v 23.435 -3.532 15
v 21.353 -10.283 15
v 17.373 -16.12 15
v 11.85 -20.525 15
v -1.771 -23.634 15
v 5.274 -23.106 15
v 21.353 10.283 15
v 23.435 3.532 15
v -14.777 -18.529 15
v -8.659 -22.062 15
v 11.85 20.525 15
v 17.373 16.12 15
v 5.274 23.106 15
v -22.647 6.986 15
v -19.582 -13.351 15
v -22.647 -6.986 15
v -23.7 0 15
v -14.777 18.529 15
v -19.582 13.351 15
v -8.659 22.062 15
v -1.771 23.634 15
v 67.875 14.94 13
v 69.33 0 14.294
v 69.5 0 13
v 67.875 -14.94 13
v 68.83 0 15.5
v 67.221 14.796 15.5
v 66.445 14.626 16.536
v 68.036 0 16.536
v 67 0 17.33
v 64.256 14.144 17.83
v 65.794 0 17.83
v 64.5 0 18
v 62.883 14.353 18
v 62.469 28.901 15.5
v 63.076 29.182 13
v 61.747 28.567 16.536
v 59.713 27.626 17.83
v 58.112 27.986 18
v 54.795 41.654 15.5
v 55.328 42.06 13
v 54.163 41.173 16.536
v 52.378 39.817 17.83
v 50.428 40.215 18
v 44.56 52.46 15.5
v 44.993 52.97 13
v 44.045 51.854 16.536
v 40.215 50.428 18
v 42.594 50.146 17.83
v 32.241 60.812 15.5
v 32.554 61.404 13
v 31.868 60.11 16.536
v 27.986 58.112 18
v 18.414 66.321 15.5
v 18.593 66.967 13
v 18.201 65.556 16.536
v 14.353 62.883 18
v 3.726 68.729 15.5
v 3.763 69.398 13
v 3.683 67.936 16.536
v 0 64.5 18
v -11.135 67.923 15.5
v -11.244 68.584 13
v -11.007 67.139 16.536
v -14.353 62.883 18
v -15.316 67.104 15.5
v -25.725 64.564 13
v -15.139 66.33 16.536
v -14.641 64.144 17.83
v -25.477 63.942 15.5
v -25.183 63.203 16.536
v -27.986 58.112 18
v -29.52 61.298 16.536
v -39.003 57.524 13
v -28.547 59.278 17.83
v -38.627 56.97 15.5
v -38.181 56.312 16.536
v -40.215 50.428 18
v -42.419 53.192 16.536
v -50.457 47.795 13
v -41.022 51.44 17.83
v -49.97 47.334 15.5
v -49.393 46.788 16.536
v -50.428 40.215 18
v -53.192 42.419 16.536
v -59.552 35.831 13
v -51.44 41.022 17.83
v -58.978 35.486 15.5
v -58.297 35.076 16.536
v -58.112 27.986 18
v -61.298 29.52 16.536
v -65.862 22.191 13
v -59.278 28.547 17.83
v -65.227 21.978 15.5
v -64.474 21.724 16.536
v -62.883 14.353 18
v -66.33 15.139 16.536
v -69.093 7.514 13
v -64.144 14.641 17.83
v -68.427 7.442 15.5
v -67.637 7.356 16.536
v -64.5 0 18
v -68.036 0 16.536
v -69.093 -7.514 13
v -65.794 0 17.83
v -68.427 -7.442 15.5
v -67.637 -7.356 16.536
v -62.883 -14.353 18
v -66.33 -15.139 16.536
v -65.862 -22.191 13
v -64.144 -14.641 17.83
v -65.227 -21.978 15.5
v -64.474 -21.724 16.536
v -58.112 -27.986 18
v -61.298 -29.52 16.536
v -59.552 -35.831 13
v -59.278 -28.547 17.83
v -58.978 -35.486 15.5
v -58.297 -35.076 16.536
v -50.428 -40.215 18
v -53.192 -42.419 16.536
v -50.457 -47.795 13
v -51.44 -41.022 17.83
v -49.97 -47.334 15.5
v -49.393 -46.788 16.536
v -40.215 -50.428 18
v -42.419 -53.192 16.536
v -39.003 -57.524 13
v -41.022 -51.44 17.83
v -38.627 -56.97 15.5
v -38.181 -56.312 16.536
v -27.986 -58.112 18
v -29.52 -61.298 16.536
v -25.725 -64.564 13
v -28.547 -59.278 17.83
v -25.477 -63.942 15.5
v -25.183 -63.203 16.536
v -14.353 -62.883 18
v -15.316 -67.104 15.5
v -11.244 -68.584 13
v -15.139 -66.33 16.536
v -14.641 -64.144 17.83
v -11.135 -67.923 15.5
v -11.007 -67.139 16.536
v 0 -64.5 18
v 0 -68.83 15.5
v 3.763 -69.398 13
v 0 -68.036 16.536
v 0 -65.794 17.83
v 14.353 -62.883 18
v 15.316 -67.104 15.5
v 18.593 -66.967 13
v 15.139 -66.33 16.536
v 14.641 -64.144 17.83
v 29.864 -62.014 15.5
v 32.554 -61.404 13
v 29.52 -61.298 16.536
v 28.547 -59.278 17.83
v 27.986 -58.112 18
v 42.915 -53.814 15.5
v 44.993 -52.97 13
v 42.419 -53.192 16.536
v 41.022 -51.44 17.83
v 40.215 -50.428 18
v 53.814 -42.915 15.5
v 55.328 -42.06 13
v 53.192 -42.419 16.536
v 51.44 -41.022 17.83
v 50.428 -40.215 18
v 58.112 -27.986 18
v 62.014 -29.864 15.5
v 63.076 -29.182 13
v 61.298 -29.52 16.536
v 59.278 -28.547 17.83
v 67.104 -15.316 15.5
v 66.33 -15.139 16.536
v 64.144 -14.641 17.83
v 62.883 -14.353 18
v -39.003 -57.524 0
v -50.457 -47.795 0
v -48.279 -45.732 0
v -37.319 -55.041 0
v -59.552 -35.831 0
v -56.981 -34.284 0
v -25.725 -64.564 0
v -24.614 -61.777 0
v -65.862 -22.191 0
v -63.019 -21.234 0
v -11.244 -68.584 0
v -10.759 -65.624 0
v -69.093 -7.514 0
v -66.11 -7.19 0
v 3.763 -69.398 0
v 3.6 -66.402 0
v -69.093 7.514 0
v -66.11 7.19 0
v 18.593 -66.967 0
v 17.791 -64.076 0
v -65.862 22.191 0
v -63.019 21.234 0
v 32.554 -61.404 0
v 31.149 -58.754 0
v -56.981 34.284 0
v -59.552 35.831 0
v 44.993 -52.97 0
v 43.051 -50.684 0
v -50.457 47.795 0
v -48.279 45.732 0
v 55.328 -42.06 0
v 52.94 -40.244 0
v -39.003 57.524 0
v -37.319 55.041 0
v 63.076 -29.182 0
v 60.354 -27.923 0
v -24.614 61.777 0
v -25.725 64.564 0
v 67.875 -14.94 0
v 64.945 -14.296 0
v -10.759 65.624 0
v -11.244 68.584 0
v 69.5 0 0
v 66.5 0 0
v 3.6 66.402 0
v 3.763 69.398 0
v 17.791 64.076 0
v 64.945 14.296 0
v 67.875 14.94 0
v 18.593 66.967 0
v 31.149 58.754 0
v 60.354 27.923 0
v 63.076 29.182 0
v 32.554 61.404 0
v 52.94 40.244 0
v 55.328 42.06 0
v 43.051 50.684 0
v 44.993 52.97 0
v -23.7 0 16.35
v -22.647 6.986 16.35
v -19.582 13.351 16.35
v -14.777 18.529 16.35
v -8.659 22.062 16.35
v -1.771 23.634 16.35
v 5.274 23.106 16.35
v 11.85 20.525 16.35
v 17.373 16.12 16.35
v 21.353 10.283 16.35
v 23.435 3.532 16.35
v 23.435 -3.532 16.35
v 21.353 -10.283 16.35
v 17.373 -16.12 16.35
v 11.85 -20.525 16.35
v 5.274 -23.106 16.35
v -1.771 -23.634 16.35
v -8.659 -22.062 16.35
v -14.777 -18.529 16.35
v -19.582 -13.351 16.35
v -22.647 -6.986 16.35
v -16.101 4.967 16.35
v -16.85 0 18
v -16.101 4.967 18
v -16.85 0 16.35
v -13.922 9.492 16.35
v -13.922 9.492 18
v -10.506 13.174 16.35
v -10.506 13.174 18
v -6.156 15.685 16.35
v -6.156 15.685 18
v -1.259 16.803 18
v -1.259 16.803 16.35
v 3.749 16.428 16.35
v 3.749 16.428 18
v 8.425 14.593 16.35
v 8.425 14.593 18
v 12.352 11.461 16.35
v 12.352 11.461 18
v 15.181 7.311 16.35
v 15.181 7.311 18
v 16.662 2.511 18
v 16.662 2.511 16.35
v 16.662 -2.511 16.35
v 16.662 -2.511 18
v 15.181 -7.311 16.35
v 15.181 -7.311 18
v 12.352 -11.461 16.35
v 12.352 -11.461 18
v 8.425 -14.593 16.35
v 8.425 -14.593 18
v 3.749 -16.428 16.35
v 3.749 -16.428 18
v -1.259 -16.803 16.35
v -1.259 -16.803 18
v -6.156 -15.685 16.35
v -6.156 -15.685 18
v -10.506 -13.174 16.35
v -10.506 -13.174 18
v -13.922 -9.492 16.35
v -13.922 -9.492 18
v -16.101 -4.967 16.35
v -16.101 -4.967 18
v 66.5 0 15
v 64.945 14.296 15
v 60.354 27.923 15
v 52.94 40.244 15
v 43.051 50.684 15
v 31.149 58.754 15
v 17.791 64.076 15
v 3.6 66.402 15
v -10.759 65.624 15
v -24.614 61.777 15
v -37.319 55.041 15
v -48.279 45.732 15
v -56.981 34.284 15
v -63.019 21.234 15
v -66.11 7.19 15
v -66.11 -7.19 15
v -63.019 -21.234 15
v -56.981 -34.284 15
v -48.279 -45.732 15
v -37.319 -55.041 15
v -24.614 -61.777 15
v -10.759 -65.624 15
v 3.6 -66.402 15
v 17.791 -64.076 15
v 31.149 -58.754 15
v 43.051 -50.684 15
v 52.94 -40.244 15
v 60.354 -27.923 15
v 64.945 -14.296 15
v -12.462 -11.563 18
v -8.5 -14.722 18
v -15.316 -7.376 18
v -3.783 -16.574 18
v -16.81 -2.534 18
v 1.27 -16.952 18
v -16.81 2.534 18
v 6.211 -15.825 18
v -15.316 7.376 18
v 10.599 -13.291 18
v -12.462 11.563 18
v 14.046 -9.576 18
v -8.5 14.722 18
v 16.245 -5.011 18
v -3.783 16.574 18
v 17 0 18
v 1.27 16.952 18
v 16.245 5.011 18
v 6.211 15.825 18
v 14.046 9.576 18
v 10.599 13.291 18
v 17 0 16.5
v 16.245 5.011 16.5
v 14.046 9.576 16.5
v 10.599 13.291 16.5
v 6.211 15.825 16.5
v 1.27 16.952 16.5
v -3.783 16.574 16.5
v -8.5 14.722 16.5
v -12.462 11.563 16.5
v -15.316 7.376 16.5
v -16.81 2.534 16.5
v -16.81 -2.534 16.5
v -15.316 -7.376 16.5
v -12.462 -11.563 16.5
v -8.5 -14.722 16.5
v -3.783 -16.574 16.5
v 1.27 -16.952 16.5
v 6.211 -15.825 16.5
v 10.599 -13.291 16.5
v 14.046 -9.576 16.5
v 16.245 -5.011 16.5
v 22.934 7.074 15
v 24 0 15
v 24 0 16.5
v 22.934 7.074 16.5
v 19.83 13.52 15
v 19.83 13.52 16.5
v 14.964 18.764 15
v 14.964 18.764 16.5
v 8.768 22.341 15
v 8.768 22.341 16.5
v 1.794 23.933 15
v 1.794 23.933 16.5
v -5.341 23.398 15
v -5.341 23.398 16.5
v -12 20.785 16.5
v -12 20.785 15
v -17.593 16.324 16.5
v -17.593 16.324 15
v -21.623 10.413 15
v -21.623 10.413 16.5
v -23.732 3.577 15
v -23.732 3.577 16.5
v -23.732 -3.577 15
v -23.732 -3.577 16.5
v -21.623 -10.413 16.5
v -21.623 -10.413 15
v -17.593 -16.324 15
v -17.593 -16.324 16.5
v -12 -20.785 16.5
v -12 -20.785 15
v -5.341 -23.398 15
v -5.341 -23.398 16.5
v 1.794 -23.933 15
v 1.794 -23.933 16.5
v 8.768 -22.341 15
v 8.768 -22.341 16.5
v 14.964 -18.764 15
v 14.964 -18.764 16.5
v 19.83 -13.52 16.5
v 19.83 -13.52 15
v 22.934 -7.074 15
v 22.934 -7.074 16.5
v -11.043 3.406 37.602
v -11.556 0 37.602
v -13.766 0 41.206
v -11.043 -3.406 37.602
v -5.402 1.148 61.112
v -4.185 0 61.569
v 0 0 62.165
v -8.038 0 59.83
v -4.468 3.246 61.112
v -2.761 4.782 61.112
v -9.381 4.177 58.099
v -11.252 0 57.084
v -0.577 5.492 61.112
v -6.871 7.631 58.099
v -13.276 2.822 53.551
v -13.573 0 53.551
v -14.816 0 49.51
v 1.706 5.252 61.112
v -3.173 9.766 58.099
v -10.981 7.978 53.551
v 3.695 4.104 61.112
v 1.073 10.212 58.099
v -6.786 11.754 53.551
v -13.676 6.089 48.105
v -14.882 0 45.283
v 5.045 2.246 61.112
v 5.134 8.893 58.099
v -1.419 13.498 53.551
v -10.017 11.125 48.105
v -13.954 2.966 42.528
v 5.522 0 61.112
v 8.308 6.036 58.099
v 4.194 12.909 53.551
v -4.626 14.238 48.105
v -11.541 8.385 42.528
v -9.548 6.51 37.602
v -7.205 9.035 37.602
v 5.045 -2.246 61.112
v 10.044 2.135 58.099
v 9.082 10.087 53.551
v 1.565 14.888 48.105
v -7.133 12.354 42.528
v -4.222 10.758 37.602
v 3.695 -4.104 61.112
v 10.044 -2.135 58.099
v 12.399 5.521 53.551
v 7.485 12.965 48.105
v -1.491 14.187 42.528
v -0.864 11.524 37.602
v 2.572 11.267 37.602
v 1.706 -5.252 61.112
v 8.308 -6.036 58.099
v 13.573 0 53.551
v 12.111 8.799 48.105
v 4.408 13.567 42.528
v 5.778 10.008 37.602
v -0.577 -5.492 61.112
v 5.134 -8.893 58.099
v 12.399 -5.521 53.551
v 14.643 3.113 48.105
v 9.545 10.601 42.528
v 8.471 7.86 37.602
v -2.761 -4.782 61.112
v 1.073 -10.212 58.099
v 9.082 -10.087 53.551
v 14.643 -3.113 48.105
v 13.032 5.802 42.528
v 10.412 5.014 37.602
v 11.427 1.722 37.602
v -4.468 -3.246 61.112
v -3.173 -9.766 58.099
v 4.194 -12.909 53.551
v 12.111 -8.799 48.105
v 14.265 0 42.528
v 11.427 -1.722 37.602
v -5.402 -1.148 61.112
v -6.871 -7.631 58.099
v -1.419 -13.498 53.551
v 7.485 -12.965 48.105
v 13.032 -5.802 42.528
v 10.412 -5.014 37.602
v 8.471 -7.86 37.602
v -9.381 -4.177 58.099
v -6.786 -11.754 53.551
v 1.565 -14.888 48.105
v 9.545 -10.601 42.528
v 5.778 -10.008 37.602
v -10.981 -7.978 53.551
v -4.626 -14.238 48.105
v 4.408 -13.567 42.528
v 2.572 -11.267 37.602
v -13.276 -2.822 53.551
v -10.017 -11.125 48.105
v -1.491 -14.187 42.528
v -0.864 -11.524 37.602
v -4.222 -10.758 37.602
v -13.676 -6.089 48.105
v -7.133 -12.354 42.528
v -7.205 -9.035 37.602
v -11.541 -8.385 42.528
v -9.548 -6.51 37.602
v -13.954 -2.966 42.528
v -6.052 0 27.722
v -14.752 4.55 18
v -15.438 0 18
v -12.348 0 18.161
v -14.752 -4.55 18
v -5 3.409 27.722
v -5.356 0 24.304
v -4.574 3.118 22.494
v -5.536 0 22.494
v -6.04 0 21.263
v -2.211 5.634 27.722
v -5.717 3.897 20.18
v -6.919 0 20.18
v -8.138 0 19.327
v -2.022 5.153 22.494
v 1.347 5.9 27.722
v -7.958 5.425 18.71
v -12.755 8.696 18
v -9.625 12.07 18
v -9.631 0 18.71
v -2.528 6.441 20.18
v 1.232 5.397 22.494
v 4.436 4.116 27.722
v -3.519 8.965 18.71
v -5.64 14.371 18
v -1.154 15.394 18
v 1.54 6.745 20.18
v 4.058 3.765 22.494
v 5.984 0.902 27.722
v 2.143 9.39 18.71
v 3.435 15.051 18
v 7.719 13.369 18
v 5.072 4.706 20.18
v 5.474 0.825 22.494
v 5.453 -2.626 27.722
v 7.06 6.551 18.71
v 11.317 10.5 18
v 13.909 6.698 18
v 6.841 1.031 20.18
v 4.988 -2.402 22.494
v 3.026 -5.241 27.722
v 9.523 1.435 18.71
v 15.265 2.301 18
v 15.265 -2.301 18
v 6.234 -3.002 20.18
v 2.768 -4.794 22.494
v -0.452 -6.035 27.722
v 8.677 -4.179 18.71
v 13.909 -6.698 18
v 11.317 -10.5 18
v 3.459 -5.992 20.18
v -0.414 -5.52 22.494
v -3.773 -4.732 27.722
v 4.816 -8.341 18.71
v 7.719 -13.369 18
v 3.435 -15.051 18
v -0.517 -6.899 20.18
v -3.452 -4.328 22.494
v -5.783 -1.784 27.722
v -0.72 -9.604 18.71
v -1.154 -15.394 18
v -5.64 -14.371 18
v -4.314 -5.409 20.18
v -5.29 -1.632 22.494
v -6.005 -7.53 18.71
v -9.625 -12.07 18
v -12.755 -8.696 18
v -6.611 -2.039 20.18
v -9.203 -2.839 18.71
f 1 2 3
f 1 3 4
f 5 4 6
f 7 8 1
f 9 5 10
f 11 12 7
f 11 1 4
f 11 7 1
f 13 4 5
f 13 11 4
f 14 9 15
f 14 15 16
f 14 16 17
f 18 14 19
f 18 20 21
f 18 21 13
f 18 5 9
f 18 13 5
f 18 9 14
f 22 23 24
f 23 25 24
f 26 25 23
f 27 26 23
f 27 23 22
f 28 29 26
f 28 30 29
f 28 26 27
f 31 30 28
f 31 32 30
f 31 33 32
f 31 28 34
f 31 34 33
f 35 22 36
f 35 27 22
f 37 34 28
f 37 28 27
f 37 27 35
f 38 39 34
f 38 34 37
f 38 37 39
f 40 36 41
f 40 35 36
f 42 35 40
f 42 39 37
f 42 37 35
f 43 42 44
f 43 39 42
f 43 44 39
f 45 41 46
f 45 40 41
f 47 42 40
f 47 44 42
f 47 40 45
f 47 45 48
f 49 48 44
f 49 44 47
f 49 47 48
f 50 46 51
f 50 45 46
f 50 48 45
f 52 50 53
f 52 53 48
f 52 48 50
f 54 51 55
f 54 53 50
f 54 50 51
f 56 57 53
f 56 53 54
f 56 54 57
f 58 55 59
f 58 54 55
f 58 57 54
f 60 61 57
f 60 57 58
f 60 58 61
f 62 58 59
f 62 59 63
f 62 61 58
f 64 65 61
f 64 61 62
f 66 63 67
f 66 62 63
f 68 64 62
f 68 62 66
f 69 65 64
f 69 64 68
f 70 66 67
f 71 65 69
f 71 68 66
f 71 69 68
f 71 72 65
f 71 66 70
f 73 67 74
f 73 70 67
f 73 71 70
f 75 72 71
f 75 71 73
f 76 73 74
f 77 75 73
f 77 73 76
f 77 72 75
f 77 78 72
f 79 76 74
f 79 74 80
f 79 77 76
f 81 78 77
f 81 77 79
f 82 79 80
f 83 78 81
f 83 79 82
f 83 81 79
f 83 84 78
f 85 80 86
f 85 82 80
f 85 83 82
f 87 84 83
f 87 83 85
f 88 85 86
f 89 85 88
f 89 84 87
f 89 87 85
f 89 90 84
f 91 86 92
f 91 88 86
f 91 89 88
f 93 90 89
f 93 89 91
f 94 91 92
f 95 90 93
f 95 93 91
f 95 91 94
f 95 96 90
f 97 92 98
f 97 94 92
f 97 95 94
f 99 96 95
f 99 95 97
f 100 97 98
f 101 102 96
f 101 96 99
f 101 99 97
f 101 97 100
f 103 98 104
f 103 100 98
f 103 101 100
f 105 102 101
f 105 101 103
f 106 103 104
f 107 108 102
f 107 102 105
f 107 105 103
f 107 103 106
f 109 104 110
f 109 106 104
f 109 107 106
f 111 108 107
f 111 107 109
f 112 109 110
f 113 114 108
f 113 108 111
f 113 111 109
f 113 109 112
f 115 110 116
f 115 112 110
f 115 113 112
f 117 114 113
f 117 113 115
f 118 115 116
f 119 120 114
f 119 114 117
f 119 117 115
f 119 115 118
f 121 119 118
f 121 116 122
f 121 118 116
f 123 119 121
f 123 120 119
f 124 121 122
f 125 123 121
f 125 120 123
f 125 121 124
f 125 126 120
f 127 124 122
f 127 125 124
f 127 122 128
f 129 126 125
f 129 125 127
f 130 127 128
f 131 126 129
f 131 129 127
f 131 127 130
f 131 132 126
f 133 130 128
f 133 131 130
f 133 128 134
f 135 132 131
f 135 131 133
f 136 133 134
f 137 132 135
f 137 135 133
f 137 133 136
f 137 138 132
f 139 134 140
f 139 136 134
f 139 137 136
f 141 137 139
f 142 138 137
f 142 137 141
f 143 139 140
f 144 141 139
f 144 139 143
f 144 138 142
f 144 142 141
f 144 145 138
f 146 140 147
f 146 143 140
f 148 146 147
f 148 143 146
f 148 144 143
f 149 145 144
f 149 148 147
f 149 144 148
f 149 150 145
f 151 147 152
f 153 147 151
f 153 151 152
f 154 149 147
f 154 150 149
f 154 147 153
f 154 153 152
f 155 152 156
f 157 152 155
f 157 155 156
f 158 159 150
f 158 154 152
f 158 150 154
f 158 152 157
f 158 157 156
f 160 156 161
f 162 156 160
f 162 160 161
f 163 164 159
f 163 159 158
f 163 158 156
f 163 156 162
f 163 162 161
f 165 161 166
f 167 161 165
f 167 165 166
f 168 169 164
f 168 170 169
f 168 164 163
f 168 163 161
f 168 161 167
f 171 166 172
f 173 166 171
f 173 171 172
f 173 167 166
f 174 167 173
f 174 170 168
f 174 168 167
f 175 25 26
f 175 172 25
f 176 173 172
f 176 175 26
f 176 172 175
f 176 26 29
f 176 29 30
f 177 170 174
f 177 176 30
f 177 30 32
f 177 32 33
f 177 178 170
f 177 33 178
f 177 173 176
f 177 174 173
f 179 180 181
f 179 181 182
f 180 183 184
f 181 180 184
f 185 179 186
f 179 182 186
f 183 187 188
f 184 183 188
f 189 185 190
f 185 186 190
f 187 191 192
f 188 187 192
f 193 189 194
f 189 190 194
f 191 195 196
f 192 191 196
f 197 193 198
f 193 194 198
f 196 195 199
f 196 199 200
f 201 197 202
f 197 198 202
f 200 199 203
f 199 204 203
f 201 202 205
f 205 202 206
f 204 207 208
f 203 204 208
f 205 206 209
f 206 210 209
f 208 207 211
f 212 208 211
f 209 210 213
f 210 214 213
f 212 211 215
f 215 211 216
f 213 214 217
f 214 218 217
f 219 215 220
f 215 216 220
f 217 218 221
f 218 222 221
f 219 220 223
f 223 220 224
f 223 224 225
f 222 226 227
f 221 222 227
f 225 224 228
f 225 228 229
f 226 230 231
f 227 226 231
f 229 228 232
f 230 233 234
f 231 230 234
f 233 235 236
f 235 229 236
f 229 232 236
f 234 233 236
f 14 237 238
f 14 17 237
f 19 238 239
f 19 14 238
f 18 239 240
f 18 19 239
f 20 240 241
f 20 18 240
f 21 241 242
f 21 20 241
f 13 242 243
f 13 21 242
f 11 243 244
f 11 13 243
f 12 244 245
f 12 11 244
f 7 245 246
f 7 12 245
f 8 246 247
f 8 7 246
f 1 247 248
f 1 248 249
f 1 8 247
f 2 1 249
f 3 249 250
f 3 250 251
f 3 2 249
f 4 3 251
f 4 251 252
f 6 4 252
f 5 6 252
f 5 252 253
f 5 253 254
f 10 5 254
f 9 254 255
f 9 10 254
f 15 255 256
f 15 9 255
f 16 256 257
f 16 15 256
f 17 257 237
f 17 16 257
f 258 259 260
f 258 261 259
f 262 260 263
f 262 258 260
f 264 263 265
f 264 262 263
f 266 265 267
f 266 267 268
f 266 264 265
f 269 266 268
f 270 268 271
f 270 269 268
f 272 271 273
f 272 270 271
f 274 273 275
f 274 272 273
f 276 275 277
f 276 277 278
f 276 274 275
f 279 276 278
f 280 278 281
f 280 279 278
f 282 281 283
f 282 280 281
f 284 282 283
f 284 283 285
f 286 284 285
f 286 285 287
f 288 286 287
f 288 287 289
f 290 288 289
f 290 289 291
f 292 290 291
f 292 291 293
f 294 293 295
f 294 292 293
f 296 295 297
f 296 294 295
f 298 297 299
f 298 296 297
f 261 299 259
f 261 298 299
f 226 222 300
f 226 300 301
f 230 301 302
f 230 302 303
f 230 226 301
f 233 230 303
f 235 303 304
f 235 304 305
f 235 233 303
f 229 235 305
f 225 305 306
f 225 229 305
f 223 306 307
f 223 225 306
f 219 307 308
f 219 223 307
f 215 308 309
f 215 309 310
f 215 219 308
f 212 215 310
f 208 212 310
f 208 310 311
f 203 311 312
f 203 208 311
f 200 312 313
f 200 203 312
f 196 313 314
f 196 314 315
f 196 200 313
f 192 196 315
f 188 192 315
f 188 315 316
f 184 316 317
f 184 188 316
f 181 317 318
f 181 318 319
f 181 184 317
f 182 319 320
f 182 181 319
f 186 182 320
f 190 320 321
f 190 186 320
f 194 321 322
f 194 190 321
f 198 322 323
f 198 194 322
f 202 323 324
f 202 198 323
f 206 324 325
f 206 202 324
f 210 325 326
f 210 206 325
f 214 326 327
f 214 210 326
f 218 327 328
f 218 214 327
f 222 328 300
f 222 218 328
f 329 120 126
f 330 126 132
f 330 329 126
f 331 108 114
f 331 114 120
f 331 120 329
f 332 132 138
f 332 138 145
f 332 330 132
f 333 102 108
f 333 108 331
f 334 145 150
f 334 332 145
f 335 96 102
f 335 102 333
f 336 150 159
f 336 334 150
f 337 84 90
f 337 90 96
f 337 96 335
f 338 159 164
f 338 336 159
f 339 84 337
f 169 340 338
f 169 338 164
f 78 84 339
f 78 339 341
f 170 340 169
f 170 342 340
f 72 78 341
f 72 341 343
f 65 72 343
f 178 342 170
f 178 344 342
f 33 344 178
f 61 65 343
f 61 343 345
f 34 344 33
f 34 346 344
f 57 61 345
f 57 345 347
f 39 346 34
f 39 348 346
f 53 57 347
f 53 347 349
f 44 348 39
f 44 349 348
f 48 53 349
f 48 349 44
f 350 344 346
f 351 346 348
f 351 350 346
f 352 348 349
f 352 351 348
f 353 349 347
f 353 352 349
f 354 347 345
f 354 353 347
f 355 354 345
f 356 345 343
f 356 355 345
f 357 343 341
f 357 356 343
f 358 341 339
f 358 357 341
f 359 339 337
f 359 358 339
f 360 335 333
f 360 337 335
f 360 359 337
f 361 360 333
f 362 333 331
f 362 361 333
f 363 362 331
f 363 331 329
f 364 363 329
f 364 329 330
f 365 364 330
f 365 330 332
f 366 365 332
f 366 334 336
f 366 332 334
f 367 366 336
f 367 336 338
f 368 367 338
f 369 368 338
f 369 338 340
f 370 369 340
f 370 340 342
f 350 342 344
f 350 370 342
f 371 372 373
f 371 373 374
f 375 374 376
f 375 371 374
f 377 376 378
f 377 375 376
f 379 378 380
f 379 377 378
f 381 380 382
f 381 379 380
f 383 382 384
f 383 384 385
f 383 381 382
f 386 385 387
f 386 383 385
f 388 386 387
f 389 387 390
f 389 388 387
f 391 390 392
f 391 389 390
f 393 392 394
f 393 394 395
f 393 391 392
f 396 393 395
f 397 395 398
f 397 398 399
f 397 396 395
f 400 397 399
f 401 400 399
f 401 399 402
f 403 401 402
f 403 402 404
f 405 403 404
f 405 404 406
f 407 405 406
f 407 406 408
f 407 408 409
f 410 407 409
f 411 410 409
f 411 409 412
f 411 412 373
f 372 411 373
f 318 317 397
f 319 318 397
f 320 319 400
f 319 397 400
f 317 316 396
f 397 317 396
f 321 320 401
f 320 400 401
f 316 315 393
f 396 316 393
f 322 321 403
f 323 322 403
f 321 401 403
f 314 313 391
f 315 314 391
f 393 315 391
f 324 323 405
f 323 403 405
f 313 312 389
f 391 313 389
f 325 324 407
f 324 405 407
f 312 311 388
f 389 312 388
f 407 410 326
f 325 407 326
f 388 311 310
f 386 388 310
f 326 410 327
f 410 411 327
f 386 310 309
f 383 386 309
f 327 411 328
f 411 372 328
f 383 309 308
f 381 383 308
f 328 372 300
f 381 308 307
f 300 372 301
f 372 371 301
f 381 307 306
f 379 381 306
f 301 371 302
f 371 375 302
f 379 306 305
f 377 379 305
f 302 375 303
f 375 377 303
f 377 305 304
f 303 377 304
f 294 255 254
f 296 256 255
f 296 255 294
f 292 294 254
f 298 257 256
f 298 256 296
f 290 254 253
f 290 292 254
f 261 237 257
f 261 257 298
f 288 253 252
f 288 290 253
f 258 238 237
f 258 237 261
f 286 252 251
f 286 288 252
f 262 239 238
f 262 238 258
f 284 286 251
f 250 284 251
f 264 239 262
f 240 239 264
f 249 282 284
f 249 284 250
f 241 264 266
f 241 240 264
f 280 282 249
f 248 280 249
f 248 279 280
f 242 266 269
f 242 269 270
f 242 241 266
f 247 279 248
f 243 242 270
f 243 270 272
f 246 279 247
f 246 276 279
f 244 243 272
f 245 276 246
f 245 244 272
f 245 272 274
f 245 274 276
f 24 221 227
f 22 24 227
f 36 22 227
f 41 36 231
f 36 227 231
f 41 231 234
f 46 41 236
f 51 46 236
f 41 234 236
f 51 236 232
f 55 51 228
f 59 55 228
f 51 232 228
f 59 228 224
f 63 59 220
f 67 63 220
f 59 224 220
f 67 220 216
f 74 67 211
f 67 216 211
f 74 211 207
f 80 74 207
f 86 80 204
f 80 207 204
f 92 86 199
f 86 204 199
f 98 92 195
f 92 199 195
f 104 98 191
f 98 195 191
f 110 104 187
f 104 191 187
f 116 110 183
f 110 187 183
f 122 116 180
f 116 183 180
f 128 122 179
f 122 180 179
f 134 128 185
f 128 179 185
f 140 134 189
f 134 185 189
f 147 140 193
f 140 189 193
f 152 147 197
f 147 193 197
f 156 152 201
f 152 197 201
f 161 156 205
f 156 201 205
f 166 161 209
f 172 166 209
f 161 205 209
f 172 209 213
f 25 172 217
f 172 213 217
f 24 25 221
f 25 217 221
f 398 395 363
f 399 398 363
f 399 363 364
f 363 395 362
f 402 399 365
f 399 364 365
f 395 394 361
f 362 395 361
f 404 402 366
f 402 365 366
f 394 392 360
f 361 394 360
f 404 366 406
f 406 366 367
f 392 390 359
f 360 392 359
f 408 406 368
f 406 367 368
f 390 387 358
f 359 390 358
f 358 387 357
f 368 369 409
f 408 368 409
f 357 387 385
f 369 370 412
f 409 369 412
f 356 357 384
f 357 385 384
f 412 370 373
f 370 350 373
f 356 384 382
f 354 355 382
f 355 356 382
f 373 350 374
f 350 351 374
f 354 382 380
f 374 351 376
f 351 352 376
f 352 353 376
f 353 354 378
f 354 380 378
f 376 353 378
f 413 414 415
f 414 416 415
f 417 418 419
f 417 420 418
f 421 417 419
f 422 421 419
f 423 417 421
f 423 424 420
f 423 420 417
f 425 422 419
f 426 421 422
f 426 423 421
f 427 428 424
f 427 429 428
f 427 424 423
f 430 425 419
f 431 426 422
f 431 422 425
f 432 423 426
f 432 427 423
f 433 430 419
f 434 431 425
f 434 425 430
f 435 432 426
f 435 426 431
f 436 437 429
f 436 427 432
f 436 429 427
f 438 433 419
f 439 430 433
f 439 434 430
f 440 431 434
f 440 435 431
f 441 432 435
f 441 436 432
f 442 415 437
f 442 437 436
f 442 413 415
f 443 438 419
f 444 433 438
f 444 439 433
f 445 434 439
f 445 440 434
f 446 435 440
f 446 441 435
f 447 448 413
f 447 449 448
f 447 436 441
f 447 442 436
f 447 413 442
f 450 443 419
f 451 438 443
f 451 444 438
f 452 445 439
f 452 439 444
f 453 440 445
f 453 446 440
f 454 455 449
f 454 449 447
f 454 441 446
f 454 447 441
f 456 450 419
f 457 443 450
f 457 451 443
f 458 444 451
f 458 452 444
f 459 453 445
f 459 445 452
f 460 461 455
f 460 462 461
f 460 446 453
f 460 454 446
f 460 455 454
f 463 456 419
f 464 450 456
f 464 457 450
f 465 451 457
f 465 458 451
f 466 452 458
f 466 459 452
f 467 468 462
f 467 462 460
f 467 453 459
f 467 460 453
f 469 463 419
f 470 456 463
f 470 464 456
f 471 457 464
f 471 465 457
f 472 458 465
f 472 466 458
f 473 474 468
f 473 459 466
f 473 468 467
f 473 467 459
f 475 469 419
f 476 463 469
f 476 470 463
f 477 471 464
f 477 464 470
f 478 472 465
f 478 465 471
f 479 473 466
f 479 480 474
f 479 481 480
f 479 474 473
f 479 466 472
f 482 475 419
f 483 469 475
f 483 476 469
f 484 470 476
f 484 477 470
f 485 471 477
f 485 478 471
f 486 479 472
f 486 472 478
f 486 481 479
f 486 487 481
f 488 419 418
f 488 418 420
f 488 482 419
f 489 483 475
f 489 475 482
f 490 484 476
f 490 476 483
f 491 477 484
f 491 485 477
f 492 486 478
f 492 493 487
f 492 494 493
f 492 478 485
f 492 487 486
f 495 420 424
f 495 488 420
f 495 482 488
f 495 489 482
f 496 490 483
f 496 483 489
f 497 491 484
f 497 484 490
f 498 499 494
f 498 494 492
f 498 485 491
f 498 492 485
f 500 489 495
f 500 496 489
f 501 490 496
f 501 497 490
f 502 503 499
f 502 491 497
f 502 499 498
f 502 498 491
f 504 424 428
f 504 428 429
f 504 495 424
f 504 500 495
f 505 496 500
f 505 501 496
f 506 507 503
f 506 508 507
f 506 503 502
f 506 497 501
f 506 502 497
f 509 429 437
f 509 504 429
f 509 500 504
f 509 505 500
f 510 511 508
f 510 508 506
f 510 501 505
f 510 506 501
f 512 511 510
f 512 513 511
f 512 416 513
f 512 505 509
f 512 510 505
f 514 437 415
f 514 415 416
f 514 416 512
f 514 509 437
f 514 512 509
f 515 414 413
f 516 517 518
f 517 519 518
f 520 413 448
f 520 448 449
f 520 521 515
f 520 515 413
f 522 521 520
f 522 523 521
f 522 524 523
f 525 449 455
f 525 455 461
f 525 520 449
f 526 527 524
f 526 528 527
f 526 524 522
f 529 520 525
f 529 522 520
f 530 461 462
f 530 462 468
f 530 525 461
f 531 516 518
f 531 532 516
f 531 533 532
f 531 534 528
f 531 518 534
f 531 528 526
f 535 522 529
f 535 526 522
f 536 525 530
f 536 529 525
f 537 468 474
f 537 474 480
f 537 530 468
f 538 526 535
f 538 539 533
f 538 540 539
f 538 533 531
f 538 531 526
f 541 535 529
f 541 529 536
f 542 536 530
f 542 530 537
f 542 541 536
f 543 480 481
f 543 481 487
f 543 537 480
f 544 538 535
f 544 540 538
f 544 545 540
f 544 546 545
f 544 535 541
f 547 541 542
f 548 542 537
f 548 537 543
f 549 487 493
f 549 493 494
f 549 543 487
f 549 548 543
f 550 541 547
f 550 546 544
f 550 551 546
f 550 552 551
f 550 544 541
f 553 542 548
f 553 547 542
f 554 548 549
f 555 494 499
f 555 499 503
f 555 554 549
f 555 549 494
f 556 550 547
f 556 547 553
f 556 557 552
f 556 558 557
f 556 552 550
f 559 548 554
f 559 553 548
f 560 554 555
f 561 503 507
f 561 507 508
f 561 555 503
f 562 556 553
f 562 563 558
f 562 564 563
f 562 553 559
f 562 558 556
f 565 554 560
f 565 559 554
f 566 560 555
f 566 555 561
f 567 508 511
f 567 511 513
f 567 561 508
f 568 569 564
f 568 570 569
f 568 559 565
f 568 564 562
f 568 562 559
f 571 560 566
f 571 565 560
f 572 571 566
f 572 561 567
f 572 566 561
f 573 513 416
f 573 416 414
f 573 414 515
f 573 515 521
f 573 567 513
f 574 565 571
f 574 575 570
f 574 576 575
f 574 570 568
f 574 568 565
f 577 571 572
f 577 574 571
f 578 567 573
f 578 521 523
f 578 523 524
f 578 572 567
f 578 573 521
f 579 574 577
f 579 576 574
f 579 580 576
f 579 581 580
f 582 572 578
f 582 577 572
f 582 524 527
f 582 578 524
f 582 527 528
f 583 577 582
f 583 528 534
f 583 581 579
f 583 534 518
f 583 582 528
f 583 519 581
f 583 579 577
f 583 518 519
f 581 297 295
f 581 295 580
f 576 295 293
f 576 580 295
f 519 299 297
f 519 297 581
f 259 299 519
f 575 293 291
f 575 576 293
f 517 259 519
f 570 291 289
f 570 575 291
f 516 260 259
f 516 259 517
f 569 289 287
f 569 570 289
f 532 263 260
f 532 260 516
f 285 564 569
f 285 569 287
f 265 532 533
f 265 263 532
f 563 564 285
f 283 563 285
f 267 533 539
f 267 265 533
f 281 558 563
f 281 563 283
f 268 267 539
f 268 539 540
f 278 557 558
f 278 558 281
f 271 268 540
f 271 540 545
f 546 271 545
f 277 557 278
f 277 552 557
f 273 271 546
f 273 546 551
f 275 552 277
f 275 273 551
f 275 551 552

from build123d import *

# Parameters (mm, degrees)
F0_R     = 69.5
F0_R_2   = 66.5
F1_DEPTH = 18
F2_DEPTH = 15
F3_R     = 5
F4_R     = 17
F5_DEPTH = 18.001
F4_R_2   = 24
F6_DEPTH = 16.5


with BuildPart() as f1:
    # F0 (on Top) → F1 (new body)
    with BuildSketch(Plane.XY):
        Circle(F0_R)
        Circle(F0_R_2, mode=Mode.SUBTRACT)
        Circle(F0_R_2)
    extrude(amount=F1_DEPTH)

    # F0 (on Top) → F2 (cut)
    with BuildSketch(Plane.XY):
        Circle(F0_R_2)
    extrude(amount=F2_DEPTH, mode=Mode.SUBTRACT)

    # F3
    f3_edges = [f1.edges().sort_by_distance(p)[0] for p in [
        (-69.5, 0, 18),
    ]]
    fillet(f3_edges, radius=F3_R)

    # F4 (on Top) → F5 (cut, through all)
    with BuildSketch(Plane.XY):
        Circle(F4_R)
    extrude(amount=F5_DEPTH, mode=Mode.SUBTRACT)

    # F4 (on Top) → F6 (cut)
    with BuildSketch(Plane.XY):
        Circle(F4_R_2)
        Circle(F4_R, mode=Mode.SUBTRACT)
    extrude(amount=F6_DEPTH, mode=Mode.SUBTRACT)


with BuildPart() as f8:
    # F7 (on Front) → F8 (revolve)
    with BuildSketch(Plane.XZ):
        with BuildLine():
            Line((0, 32.16504), (0, 62.16504))
            ThreePointArc((0, 62.16504), (-13.572853, 53.550779), (-11.556359, 37.602061))
            ThreePointArc((-11.556359, 37.602061), (-6.385739, 33.592187), (0, 32.16504))
        make_face()
        with BuildLine():
            ThreePointArc((0, 32.16504), (-6.385739, 33.592187), (-11.556359, 37.602061))
            add(Edge.make_bspline(
                [(-11.556359, 37.602061), (0, 21.309038), (-6.51616, 18), (-15.437647, 18)],
                knots=[0, 0, 0, 0, 19.982623, 19.982623, 19.982623, 19.982623], degree=3))
            Line((-15.437647, 18), (0, 18))
            Line((0, 18), (0, 32.16504))
        make_face()
        Polygon((0, 18), (-15.437647, 18), (-16.85, 18), (-16.85, 16.35), (-23.7, 16.35), (-23.7, 15), (0, 15), align=None)
    revolve(axis=Axis((0, 0, 38.341664), (0, 0, -1)))


solid = Compound([f1.part, f8.part])
